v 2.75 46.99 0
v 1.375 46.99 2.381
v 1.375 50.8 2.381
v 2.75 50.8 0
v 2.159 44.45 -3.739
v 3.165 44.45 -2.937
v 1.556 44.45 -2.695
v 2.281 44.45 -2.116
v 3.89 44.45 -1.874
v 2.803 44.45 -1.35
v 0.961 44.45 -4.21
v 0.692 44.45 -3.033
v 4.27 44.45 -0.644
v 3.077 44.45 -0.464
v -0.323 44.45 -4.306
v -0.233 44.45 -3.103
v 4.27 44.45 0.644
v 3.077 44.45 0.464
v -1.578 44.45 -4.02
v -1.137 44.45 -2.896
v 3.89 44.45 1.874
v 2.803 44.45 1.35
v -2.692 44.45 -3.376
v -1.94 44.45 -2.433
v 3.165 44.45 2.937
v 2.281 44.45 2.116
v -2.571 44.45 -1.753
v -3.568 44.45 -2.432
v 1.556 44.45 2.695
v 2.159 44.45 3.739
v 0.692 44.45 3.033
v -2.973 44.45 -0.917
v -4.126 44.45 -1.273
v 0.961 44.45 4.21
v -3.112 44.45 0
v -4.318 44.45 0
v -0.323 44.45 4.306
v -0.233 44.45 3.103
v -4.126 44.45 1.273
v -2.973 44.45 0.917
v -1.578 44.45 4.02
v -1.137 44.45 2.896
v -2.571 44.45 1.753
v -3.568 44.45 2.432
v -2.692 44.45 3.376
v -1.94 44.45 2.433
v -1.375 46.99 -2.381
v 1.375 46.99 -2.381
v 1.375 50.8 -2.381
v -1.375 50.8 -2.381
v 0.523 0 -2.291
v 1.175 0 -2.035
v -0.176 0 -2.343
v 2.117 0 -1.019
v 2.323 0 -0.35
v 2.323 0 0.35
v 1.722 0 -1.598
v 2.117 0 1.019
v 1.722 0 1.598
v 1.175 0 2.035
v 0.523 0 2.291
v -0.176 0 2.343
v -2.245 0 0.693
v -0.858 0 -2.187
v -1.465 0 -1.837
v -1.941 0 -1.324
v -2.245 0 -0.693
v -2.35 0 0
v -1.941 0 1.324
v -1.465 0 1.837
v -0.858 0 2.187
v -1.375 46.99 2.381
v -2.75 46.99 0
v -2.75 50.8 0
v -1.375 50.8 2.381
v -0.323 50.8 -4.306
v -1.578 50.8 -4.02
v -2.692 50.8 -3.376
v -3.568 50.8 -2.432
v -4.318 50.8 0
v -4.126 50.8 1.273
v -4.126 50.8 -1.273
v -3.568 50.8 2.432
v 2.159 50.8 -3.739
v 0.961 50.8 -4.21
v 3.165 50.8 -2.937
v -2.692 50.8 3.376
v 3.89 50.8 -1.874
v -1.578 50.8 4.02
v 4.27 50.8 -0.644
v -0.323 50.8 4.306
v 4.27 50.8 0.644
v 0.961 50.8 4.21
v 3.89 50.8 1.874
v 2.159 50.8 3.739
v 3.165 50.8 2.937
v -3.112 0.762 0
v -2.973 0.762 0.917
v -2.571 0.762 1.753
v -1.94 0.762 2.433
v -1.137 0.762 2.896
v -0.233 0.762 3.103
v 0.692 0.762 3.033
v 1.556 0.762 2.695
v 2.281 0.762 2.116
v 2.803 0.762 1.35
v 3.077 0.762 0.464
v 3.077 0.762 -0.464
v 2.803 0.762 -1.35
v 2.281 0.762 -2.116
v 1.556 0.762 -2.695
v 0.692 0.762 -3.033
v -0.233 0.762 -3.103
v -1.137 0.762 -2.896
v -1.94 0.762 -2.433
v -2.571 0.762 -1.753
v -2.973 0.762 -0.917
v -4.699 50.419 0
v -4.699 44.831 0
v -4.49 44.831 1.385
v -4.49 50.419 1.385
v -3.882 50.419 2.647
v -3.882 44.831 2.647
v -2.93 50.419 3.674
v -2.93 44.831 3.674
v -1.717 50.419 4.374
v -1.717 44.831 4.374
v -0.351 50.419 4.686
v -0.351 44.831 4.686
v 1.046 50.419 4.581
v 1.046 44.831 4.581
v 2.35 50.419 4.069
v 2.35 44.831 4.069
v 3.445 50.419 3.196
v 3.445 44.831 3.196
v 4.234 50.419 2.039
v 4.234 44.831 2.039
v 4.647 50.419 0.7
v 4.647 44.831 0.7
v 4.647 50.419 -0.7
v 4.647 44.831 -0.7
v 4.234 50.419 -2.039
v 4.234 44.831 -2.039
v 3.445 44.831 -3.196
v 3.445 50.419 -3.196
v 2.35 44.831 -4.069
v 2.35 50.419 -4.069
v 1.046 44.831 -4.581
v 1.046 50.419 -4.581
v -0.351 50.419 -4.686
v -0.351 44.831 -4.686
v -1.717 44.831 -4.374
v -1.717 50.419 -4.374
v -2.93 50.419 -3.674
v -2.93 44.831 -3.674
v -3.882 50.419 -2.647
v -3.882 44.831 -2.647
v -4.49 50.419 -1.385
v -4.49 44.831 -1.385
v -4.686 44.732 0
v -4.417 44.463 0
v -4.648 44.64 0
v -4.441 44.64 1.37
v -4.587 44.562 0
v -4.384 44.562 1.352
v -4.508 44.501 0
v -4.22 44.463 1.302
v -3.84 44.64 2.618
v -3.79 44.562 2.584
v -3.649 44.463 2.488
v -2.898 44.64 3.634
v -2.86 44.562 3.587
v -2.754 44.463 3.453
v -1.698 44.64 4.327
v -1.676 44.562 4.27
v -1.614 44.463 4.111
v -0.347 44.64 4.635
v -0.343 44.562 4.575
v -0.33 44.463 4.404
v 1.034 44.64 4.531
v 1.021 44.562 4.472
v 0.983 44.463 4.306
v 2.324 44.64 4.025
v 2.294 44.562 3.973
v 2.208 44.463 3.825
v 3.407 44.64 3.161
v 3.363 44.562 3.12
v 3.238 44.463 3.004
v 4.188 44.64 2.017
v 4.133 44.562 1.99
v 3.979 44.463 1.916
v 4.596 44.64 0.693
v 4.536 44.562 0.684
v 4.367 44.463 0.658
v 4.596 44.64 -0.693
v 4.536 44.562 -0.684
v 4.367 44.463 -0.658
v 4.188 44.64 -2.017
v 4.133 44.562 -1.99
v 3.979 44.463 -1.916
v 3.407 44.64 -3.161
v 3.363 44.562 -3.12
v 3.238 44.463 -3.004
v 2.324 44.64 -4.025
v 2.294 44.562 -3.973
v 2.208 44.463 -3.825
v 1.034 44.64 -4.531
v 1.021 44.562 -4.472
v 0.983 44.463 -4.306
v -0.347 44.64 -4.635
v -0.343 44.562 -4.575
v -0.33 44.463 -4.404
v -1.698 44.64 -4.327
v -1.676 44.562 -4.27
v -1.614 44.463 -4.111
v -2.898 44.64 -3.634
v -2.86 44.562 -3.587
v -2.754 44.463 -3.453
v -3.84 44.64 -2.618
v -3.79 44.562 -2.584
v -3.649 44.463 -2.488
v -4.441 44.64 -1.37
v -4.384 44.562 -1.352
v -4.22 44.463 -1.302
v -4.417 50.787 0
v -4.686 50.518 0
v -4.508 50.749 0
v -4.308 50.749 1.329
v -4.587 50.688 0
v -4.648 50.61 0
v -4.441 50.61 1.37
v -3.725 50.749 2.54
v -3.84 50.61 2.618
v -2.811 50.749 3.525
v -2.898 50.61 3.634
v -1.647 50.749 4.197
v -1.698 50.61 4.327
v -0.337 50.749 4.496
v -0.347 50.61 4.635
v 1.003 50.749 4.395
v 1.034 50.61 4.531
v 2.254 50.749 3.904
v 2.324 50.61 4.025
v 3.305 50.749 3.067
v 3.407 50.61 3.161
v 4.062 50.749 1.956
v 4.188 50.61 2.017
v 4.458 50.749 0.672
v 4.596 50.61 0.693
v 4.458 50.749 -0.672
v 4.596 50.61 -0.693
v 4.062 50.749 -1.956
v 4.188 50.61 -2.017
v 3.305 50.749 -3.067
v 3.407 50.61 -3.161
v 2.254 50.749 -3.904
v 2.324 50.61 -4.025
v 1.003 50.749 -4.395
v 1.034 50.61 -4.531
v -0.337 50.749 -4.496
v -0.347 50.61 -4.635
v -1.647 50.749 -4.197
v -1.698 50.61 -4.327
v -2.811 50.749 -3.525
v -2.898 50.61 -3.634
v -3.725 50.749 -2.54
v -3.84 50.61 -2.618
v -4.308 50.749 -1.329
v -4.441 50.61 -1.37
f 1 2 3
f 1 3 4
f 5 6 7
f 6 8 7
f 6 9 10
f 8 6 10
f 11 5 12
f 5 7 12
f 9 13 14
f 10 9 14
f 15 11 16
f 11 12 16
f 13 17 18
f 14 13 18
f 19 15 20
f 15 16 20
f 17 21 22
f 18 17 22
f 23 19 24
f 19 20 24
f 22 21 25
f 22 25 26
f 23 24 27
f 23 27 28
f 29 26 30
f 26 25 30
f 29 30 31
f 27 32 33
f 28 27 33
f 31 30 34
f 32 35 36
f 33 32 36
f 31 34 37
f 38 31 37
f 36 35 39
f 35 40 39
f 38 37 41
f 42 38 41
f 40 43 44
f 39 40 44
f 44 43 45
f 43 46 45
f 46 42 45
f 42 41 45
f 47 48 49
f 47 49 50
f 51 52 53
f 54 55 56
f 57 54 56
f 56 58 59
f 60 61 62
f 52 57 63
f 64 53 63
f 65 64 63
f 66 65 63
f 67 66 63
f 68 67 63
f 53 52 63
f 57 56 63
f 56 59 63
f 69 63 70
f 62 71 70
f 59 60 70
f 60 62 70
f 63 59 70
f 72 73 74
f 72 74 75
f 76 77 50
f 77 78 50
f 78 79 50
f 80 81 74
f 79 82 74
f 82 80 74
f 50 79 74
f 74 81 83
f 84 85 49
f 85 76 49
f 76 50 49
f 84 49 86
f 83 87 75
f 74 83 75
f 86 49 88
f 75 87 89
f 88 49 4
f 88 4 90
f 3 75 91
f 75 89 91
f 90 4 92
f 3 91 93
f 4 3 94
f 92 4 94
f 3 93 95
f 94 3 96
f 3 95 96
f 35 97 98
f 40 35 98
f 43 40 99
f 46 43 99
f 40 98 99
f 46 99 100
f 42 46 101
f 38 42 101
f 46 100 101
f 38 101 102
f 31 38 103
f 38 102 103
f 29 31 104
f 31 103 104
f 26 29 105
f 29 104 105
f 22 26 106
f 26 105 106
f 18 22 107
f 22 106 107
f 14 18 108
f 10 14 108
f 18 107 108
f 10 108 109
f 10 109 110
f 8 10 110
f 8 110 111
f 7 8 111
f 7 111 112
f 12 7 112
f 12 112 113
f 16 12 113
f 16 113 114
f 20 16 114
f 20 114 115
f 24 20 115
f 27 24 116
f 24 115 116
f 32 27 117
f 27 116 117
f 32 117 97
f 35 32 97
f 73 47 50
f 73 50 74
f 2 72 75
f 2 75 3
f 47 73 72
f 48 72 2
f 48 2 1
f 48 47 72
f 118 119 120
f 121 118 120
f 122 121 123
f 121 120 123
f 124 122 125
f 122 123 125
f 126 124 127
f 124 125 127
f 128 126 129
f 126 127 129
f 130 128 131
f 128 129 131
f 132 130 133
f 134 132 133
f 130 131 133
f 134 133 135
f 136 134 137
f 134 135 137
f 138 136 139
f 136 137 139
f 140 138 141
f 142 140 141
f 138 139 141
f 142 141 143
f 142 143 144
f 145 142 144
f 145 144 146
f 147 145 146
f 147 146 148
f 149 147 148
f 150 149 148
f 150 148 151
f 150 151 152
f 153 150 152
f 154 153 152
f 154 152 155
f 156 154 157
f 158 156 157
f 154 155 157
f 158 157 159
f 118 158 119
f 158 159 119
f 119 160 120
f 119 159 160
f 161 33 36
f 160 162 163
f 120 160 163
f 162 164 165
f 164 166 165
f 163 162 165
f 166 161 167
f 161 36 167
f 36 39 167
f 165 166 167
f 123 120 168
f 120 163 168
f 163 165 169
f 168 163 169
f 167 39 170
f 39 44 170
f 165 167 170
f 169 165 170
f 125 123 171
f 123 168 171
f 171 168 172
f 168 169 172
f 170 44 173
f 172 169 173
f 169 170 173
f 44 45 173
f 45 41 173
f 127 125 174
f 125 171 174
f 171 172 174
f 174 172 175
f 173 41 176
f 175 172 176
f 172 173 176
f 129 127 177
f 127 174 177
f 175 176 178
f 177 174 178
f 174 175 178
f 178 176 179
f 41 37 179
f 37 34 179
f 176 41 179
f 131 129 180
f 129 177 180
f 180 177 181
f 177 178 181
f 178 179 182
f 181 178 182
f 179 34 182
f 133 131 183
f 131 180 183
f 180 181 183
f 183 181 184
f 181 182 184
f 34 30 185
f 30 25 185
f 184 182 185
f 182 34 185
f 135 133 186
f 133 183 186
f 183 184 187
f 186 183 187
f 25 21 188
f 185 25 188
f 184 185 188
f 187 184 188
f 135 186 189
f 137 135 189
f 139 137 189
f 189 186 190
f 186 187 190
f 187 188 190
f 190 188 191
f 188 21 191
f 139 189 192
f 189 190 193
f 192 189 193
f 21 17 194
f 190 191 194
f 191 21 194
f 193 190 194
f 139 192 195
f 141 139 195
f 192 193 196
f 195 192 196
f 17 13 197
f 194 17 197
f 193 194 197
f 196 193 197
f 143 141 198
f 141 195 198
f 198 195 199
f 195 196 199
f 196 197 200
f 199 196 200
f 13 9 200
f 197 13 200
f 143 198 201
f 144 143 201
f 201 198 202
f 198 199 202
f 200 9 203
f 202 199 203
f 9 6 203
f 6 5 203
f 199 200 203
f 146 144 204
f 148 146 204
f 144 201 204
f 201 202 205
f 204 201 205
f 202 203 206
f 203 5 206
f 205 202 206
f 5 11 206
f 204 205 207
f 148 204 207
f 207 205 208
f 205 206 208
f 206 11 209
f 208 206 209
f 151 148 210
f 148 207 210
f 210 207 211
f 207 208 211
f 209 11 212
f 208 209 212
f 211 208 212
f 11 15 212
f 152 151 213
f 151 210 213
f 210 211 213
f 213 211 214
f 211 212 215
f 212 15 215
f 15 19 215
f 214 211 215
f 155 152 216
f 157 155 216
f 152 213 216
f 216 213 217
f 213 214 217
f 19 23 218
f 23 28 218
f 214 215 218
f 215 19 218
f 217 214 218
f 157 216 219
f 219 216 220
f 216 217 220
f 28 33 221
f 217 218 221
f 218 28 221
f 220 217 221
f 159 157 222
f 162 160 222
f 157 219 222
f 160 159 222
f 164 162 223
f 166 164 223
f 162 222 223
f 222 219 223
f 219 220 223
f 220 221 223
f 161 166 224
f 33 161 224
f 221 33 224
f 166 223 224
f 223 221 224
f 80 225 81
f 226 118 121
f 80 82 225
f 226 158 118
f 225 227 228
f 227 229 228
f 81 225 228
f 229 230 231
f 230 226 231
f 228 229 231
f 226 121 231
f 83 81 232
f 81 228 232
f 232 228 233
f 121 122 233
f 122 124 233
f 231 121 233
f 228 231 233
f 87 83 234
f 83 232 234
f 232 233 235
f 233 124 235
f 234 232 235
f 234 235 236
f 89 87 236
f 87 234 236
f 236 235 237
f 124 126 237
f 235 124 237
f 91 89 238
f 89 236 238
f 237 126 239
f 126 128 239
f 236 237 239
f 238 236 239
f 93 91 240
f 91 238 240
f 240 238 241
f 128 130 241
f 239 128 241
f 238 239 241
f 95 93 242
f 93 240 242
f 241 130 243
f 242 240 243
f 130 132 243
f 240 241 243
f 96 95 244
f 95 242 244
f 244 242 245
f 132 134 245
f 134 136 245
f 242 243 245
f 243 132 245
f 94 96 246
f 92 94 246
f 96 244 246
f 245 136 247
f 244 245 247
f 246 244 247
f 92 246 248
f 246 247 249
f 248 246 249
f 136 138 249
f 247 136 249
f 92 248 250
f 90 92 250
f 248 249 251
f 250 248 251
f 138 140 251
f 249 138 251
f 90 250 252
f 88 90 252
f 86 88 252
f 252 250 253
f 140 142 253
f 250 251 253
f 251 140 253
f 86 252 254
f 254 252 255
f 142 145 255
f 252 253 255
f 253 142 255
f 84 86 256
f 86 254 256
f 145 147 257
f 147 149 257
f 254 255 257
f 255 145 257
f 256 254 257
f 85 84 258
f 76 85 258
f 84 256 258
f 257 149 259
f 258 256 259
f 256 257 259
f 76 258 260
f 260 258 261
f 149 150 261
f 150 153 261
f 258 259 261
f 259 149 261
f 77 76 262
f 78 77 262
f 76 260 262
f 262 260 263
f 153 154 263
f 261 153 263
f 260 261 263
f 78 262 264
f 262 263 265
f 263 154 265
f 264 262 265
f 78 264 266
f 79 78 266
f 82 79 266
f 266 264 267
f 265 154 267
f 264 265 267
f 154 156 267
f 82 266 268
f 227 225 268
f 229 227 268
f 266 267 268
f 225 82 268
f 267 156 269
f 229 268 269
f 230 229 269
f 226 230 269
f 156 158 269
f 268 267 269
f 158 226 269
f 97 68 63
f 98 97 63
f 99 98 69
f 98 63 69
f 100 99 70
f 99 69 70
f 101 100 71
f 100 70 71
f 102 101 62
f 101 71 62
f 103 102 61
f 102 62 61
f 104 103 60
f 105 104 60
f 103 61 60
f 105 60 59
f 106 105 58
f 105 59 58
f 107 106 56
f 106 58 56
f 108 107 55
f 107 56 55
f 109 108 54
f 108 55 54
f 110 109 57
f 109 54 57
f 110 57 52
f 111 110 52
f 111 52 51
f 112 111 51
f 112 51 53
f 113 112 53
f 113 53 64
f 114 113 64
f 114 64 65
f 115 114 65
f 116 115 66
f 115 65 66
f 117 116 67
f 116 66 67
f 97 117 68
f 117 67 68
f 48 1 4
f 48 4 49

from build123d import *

# Parameters (mm, degrees)
EXTRUDE1_DEPTH = 3.81
FILLET1_R      = 0.381
CHAMFER1_SIZE  = 0.762


with BuildPart() as part:
    # Sketch1 → Revolve1 (revolve)
    with BuildSketch(Plane.XY):
        Polygon((0, 0), (0, 50.8), (-4.699, 50.8), (-4.699, 44.45), (-3.1115, 44.45), (-3.1115, 0), align=None)
    revolve(axis=Axis((0, 0, 0), (0, 1, 0)))

    # Sketch2 → Extrude1 (cut)
    with BuildSketch(Plane(origin=(0, 50.8, 0), x_dir=(1, 0, 0), z_dir=(0, 1, 0))):
        Polygon((2.7496262, 0), (1.3748131, 2.38124614), (-1.3748131, 2.38124614), (-2.7496262, 0), (-1.3748131, -2.38124614), (1.3748131, -2.38124614), align=None)
    extrude(amount=-EXTRUDE1_DEPTH, mode=Mode.SUBTRACT)

    # Fillet1
    fillet1_edges = [part.edges().sort_by_distance(p)[0] for p in [
        (4.699, 44.45, 0),
        (4.699, 50.8, 0),
    ]]
    fillet(fillet1_edges, radius=FILLET1_R)

    # Chamfer1
    chamfer1_edges = [part.edges().sort_by_distance(p)[0] for p in [
        (3.1115, 0, 0),
    ]]
    chamfer(chamfer1_edges, length=CHAMFER1_SIZE)


solid = part.part
